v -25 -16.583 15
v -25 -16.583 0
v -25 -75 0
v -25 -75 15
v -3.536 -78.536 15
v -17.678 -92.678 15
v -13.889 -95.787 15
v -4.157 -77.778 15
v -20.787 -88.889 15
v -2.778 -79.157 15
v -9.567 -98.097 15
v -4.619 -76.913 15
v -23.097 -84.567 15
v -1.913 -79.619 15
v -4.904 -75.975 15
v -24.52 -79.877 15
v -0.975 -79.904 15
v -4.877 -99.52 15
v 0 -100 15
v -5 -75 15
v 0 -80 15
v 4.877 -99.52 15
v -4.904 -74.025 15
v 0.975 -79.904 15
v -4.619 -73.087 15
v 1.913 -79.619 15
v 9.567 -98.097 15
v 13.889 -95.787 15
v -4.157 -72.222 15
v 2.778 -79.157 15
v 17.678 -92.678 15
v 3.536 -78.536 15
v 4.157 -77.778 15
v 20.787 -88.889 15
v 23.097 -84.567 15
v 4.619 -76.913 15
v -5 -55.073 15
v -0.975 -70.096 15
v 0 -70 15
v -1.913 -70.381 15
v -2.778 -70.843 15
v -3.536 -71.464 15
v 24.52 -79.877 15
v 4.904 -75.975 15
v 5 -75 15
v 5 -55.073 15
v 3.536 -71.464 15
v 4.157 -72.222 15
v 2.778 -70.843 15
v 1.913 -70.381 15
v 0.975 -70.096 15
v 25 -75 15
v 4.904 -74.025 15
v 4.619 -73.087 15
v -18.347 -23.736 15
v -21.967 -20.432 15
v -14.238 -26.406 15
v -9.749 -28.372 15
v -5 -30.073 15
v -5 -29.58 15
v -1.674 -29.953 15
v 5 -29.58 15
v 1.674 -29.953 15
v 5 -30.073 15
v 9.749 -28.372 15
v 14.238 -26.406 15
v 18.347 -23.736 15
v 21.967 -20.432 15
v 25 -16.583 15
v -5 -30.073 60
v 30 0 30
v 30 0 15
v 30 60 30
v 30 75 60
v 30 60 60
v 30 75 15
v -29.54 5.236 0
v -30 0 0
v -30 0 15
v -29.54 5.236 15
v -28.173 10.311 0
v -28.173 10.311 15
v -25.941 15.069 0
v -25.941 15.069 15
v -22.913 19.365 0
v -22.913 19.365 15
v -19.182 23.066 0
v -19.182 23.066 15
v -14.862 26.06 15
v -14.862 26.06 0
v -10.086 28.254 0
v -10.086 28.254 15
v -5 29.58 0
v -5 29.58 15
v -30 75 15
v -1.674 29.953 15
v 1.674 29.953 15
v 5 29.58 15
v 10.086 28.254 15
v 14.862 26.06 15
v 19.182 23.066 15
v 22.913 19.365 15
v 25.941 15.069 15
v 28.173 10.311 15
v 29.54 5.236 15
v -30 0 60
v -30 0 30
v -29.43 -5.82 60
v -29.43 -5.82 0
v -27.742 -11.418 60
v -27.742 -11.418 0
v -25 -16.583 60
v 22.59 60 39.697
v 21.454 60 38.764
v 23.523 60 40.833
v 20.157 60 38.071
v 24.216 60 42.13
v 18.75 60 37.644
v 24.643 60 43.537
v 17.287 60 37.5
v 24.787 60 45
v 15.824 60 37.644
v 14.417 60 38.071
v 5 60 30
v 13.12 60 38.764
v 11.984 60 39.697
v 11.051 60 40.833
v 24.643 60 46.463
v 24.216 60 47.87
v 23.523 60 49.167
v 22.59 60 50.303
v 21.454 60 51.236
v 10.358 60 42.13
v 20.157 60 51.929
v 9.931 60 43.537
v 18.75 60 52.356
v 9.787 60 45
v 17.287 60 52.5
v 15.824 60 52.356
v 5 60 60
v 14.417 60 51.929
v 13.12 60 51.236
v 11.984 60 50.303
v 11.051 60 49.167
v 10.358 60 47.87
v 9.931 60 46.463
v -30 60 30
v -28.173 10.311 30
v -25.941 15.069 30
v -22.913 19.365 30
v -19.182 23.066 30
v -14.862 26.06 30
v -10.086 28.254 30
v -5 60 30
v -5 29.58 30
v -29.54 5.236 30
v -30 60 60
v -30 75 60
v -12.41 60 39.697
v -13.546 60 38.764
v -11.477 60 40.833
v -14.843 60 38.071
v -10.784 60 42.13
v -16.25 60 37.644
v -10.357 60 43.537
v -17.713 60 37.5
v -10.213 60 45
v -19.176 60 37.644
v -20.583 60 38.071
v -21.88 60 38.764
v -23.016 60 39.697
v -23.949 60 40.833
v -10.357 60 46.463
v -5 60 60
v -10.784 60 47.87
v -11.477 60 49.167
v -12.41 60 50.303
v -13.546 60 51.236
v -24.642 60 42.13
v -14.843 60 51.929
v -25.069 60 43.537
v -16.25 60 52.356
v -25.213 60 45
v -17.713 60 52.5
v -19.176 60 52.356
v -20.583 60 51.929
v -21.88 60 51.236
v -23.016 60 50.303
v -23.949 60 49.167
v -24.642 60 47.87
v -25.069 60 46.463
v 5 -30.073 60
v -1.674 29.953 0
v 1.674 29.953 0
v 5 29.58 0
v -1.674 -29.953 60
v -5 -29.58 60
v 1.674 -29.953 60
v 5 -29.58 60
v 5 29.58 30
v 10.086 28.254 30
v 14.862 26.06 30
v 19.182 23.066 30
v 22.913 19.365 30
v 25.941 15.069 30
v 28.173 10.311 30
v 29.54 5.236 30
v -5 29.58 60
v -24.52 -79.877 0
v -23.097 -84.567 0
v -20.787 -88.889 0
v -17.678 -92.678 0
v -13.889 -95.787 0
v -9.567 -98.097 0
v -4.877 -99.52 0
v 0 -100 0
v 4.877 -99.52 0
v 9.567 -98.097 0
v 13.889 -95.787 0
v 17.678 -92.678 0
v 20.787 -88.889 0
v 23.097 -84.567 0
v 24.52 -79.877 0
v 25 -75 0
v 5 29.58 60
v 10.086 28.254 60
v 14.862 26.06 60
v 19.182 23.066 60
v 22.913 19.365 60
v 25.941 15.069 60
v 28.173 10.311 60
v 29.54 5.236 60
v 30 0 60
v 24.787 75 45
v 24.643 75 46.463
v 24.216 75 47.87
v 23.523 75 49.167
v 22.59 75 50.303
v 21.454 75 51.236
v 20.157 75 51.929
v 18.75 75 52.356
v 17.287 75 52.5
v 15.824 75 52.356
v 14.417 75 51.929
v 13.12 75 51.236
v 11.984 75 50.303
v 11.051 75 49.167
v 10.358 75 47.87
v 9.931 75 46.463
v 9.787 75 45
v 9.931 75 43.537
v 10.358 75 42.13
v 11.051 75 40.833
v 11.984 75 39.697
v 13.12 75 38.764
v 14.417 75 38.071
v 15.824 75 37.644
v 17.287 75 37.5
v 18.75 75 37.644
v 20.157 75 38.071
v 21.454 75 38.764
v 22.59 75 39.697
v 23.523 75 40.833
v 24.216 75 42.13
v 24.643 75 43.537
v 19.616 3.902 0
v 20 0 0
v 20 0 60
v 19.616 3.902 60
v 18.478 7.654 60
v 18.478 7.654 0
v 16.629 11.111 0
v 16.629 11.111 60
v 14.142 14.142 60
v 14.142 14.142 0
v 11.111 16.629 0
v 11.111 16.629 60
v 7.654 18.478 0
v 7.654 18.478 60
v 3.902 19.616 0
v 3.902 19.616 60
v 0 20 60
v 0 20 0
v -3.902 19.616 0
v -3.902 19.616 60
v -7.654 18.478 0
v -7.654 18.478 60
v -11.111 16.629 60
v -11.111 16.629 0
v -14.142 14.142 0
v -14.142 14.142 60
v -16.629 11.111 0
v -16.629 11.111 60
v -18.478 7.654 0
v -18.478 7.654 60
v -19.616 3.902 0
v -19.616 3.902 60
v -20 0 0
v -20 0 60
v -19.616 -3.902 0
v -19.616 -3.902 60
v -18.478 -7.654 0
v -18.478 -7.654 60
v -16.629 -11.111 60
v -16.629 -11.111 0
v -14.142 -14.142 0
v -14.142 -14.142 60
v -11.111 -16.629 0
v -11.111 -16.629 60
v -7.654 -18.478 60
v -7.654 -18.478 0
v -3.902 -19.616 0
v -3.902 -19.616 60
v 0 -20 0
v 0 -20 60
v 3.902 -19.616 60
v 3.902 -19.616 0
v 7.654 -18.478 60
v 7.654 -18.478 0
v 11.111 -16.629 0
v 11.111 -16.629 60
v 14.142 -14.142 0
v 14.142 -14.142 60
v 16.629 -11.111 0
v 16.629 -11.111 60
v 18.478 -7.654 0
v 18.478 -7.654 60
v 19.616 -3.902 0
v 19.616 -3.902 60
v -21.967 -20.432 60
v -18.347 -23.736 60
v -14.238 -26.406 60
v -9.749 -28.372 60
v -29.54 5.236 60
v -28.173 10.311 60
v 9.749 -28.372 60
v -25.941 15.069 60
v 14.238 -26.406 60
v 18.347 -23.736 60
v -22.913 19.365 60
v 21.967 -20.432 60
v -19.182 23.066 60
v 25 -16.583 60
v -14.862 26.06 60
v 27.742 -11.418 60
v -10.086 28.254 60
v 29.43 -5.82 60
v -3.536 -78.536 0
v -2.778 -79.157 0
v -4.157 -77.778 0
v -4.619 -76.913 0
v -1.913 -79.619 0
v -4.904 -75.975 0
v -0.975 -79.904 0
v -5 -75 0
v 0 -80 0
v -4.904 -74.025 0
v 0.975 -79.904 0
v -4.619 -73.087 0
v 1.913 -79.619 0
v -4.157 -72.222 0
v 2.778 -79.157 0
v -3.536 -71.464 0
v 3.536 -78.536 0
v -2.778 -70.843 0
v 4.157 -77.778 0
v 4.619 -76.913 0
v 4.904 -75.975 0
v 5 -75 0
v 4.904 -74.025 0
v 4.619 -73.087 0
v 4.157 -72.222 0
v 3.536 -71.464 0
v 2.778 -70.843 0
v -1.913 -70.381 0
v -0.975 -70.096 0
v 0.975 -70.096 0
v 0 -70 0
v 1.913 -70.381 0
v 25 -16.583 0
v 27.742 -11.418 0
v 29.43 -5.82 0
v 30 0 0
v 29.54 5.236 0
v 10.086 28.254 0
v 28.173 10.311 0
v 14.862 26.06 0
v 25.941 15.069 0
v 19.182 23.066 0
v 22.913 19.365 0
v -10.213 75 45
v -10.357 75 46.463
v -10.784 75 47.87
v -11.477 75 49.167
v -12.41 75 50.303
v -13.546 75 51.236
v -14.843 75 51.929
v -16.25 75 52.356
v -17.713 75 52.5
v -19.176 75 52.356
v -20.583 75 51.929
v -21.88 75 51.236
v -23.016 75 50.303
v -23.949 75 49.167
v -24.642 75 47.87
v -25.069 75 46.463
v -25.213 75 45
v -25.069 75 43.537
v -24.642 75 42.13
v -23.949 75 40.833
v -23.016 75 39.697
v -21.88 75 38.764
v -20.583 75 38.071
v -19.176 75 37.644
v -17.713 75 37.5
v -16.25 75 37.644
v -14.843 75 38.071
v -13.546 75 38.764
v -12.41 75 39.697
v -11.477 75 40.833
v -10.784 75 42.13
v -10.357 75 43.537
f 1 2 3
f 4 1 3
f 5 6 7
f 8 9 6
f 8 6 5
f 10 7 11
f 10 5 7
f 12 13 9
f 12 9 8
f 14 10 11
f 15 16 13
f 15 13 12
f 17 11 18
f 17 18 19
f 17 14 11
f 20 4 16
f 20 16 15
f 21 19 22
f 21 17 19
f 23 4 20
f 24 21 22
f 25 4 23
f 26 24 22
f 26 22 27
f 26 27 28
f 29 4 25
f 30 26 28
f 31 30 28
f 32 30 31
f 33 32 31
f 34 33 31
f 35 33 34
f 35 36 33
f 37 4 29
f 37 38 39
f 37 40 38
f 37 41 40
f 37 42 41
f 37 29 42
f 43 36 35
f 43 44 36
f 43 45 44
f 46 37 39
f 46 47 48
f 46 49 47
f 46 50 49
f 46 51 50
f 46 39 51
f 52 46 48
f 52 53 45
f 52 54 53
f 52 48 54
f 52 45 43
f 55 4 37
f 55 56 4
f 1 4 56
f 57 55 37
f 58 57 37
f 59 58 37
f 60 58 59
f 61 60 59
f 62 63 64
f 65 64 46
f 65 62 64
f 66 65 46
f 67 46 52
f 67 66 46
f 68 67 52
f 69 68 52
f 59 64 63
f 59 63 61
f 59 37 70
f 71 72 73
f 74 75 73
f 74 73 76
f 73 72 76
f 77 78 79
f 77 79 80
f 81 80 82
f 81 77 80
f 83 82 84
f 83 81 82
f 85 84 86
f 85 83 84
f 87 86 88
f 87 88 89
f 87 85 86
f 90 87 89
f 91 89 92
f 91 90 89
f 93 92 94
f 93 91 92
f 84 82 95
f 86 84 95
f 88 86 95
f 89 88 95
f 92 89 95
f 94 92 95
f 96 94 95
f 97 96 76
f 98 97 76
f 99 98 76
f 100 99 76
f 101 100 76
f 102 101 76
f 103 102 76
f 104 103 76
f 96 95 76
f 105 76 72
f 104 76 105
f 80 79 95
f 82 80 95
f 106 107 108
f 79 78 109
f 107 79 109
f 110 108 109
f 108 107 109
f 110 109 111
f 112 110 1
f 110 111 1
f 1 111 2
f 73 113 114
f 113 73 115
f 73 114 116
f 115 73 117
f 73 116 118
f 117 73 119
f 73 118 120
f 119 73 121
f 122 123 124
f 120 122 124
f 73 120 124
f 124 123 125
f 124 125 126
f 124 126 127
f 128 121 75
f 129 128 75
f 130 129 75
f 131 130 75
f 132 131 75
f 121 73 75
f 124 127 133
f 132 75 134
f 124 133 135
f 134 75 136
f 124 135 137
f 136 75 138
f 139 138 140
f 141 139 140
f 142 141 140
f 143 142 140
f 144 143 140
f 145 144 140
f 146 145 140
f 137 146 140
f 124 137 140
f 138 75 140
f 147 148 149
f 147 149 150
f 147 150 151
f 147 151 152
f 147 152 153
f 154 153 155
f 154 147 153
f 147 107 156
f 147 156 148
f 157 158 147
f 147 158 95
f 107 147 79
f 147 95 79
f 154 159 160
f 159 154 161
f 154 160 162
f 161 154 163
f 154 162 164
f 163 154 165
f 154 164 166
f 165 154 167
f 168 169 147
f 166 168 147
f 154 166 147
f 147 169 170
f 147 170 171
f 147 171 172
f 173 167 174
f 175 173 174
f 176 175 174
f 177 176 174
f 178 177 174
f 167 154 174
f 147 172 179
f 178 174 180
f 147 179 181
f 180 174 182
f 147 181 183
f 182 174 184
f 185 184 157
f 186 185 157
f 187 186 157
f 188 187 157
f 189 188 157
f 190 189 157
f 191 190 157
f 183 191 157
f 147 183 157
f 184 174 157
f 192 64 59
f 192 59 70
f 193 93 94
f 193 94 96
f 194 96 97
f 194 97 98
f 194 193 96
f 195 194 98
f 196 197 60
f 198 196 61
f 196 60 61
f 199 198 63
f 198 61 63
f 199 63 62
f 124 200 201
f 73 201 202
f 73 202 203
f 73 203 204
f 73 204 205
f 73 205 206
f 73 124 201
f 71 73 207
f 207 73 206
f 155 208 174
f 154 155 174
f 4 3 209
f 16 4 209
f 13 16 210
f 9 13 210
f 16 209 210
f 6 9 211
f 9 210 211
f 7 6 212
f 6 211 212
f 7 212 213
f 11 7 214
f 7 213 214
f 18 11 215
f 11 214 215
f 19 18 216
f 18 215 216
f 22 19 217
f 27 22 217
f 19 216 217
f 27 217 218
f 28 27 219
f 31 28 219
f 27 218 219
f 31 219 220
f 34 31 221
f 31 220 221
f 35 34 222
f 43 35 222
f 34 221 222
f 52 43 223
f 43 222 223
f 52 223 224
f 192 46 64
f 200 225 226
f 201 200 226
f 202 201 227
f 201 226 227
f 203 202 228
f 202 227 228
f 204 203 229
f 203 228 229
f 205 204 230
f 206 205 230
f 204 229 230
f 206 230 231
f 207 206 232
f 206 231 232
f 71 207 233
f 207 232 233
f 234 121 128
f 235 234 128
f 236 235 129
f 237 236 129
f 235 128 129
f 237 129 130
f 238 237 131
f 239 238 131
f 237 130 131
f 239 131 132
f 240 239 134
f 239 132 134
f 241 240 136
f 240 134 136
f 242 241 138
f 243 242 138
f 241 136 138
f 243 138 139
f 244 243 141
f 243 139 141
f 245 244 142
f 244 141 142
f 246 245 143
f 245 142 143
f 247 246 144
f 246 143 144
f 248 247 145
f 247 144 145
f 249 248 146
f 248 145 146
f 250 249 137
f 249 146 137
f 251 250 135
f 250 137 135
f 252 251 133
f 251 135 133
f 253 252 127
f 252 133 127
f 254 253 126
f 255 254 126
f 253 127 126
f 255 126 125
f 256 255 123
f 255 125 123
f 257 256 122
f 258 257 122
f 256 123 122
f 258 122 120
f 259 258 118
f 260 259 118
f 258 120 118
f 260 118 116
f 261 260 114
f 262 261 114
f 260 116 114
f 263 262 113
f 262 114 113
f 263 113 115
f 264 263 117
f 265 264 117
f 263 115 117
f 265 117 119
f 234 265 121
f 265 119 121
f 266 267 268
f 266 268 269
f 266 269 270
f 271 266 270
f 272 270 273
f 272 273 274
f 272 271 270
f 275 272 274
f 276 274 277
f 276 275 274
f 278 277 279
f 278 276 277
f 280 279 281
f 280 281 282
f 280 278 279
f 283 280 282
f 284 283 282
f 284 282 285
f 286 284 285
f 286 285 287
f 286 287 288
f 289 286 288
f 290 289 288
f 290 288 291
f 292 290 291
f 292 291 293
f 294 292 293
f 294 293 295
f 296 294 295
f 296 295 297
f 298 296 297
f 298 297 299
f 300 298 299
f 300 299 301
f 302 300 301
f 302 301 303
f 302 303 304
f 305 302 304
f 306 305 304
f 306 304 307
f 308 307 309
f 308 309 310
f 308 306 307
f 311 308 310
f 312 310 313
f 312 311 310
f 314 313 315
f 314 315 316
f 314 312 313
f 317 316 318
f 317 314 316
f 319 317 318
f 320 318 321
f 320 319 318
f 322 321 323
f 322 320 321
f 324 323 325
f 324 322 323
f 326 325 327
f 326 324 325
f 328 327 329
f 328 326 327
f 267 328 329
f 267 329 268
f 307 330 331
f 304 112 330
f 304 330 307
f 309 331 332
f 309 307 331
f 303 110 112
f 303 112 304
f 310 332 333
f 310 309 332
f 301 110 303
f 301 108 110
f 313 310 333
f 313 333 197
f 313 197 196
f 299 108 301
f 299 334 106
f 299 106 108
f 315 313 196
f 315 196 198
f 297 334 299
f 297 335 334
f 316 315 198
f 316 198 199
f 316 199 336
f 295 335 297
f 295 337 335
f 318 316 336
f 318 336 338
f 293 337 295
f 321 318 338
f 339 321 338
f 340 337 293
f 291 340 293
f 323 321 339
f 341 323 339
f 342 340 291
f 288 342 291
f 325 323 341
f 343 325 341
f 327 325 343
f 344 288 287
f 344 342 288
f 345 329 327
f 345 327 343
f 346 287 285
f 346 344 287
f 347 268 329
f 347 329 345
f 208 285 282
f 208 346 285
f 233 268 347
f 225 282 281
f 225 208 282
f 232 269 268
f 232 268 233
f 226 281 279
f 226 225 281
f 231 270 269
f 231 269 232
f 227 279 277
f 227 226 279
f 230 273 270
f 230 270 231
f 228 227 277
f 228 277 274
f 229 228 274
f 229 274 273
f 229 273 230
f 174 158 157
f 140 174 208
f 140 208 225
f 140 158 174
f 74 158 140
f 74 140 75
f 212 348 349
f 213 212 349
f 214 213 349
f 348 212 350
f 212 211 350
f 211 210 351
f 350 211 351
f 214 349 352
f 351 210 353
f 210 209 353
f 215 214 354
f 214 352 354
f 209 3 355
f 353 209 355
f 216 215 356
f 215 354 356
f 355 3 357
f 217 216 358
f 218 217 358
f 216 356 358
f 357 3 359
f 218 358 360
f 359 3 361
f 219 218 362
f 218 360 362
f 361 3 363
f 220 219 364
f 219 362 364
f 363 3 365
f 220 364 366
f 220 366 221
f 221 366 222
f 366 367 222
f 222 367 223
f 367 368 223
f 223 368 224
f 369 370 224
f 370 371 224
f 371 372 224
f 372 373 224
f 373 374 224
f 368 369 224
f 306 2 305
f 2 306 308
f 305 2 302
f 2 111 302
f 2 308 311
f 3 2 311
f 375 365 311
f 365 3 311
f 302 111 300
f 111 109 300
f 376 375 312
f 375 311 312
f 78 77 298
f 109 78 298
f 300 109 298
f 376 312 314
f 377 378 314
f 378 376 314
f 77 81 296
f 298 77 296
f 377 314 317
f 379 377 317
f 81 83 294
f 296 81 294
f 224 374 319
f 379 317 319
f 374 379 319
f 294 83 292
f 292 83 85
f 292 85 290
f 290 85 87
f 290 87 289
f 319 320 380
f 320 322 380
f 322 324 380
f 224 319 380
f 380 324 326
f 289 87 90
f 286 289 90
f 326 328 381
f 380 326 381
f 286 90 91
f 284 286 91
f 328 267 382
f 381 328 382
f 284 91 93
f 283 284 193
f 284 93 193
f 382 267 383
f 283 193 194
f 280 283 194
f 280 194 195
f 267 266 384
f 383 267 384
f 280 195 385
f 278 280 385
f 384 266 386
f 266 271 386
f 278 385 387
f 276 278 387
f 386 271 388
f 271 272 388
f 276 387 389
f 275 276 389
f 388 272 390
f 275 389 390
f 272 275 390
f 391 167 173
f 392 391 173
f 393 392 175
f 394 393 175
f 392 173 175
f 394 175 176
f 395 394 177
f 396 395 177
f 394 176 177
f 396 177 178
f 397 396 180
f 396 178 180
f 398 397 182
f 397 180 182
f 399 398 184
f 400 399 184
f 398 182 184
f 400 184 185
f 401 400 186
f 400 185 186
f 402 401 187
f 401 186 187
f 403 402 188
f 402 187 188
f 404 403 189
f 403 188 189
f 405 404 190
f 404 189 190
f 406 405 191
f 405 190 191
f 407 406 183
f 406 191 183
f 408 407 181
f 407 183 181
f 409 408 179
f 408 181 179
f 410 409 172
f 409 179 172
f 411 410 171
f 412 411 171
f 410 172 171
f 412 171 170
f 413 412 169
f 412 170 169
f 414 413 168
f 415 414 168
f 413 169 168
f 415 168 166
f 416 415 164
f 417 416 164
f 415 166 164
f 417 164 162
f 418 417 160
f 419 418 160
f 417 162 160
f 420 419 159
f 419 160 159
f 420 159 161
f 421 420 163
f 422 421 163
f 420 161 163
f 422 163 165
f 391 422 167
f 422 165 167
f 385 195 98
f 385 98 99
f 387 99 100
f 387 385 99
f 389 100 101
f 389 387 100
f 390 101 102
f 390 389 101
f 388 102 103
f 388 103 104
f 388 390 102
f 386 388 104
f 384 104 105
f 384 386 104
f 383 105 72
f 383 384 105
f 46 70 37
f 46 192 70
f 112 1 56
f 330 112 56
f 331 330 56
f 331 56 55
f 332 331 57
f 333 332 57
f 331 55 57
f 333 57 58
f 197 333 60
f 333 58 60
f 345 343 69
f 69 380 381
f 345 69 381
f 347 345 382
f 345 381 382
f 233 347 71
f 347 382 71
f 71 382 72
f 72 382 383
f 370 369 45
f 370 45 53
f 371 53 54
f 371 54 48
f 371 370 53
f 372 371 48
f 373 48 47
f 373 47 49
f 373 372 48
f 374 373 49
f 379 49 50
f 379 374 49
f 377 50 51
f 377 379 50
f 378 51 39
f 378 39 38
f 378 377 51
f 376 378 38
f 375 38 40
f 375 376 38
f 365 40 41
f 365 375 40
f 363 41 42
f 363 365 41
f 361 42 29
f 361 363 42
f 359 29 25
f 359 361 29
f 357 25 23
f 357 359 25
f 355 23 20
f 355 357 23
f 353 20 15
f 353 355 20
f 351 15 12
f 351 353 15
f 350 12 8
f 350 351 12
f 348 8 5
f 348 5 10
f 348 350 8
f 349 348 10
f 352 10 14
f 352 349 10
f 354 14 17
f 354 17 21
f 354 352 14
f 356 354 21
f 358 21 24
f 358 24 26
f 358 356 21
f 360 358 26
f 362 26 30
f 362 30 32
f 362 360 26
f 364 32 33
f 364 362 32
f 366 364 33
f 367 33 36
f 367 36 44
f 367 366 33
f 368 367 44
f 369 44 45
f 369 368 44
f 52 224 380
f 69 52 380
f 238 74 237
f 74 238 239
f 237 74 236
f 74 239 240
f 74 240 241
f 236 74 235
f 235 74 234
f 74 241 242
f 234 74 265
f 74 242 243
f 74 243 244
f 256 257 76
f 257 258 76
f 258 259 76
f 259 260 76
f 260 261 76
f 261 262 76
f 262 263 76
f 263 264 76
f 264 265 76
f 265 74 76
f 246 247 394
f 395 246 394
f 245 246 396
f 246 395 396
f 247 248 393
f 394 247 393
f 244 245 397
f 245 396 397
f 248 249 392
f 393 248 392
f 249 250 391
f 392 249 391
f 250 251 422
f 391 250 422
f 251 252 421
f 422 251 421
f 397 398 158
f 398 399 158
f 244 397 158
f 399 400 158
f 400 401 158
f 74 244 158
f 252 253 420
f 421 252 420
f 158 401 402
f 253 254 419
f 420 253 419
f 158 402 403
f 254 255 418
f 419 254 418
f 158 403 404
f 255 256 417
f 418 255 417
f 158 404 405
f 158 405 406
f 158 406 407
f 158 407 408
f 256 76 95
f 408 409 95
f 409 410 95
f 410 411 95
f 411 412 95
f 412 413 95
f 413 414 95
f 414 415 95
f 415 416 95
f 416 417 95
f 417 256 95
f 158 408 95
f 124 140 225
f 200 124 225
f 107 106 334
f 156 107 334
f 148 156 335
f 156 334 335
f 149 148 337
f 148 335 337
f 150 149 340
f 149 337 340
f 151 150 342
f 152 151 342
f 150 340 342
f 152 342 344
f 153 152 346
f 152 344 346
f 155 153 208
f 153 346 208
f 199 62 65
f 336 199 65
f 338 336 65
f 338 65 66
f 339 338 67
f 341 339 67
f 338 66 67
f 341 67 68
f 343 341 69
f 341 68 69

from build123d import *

# Parameters (mm, degrees)
F0_R      = 20
F1_DEPTH  = 60
F0_R_2    = 5
F2_DEPTH  = 15
F3_DEPTH  = 60
F4_DEPTH  = 45
F5_DEPTH  = 15
F7_DEPTH  = 30
F9_DEPTH  = 5
F10_R     = 7.5
F11_DEPTH = 15


with BuildPart() as f1:
    # F0 (on Top) → F1 (new body)
    with BuildSketch(Plane.XY):
        with BuildLine():
            ThreePointArc((25, -16.5831239518), (28.7228132327, -8.6602540378), (30, 0))
            ThreePointArc((30, 0), (22.9128784748, 19.364916731), (5, 29.5803989155))
            ThreePointArc((5, 29.5803989155), (0, 30), (-5, 29.5803989155))
            ThreePointArc((-5, 29.5803989155), (-22.9128784748, 19.364916731), (-30, 0))
            ThreePointArc((-30, 0), (-28.7228132327, -8.6602540378), (-25, -16.5831239518))
            ThreePointArc((-25, -16.5831239518), (-16.3472410247, -25.1548744954), (-5, -29.5803989155))
            ThreePointArc((-5, -29.5803989155), (0, -30), (5, -29.5803989155))
            ThreePointArc((5, -29.5803989155), (16.3472410247, -25.1548744954), (25, -16.5831239518))
        make_face()
        Circle(F0_R, mode=Mode.SUBTRACT)
    extrude(amount=F1_DEPTH)

    # F0 (on Top) → F2 (join)
    with BuildSketch(Plane.XY):
        with BuildLine():
            Line((25, -75), (25, -16.5831239518))
            ThreePointArc((25, -16.5831239518), (16.3472410247, -25.1548744954), (5, -29.5803989155))
            Line((5, -29.5803989155), (5, -54.5803989155))
            Line((5, -54.5803989155), (0, -54.5803989155))
            Line((0, -54.5803989155), (-5, -54.5803989155))
            Line((-5, -54.5803989155), (-5, -29.5803989155))
            ThreePointArc((-5, -29.5803989155), (-16.3472410247, -25.1548744954), (-25, -16.5831239518))
            Line((-25, -16.5831239518), (-25, -75))
            ThreePointArc((-25, -75), (0, -100), (25, -75))
        make_face()
        with Locations((0, -75)):
            Circle(F0_R_2, mode=Mode.SUBTRACT)
        with BuildLine():
            Line((5, -54.5803989155), (5, -29.5803989155))
            ThreePointArc((5, -29.5803989155), (0, -30), (-5, -29.5803989155))
            Line((-5, -29.5803989155), (-5, -54.5803989155))
            Line((-5, -54.5803989155), (0, -54.5803989155))
            Line((0, -54.5803989155), (5, -54.5803989155))
        make_face()
    extrude(amount=F2_DEPTH)

    # F0 (on Top) → F3 (join)
    with BuildSketch(Plane.XY):
        with BuildLine():
            ThreePointArc((-30, 0), (-22.9128784748, 19.364916731), (-5, 29.5803989155))
            Line((-5, 29.5803989155), (-5, 60))
            Line((-5, 60), (-30, 60))
            Line((-30, 60), (-30, 0))
        make_face()
        with BuildLine():
            ThreePointArc((-5, 29.5803989155), (0, 30), (5, 29.5803989155))
            Line((5, 29.5803989155), (5, 60))
            Line((5, 60), (30, 60))
            Line((30, 60), (30, 75))
            Line((30, 75), (-30, 75))
            Line((-30, 75), (-30, 60))
            Line((-30, 60), (-5, 60))
            Line((-5, 60), (-5, 29.5803989155))
        make_face()
        with BuildLine():
            ThreePointArc((5, 29.5803989155), (22.9128784748, 19.364916731), (30, 0))
            Line((30, 0), (30, 60))
            Line((30, 60), (5, 60))
            Line((5, 60), (5, 29.5803989155))
        make_face()
    extrude(amount=F3_DEPTH)

    # F0 (on Top) → F4 (join)
    with BuildSketch(Plane.XY):
        with BuildLine():
            ThreePointArc((25, -16.5831239518), (28.7228132327, -8.6602540378), (30, 0))
            ThreePointArc((30, 0), (22.9128784748, 19.364916731), (5, 29.5803989155))
            ThreePointArc((5, 29.5803989155), (0, 30), (-5, 29.5803989155))
            ThreePointArc((-5, 29.5803989155), (-22.9128784748, 19.364916731), (-30, 0))
            ThreePointArc((-30, 0), (-28.7228132327, -8.6602540378), (-25, -16.5831239518))
            ThreePointArc((-25, -16.5831239518), (-16.3472410247, -25.1548744954), (-5, -29.5803989155))
            ThreePointArc((-5, -29.5803989155), (0, -30), (5, -29.5803989155))
            ThreePointArc((5, -29.5803989155), (16.3472410247, -25.1548744954), (25, -16.5831239518))
        make_face()
        Circle(F0_R, mode=Mode.SUBTRACT)
        with BuildLine():
            ThreePointArc((-5, 29.5803989155), (0, 30), (5, 29.5803989155))
            Line((5, 29.5803989155), (5, 60))
            Line((5, 60), (30, 60))
            Line((30, 60), (30, 75))
            Line((30, 75), (-30, 75))
            Line((-30, 75), (-30, 60))
            Line((-30, 60), (-5, 60))
            Line((-5, 60), (-5, 29.5803989155))
        make_face()
    extrude(amount=F4_DEPTH)

    # F0 (on Top) → F5 (cut)
    with BuildSketch(Plane.XY):
        with BuildLine():
            ThreePointArc((-30, 0), (-22.9128784748, 19.364916731), (-5, 29.5803989155))
            Line((-5, 29.5803989155), (-5, 60))
            Line((-5, 60), (-30, 60))
            Line((-30, 60), (-30, 0))
        make_face()
        with BuildLine():
            ThreePointArc((-5, 29.5803989155), (0, 30), (5, 29.5803989155))
            Line((5, 29.5803989155), (5, 60))
            Line((5, 60), (30, 60))
            Line((30, 60), (30, 75))
            Line((30, 75), (-30, 75))
            Line((-30, 75), (-30, 60))
            Line((-30, 60), (-5, 60))
            Line((-5, 60), (-5, 29.5803989155))
        make_face()
        with BuildLine():
            ThreePointArc((5, 29.5803989155), (22.9128784748, 19.364916731), (30, 0))
            Line((30, 0), (30, 60))
            Line((30, 60), (5, 60))
            Line((5, 60), (5, 29.5803989155))
        make_face()
    extrude(amount=F5_DEPTH, mode=Mode.SUBTRACT)

    # F6 (on face) → F7 (cut)
    with BuildSketch(Plane.XY.offset(60)):
        with BuildLine():
            Line((-5, 29.5803989155), (-5, 60))
            Line((-5, 60), (-30, 60))
            Line((-30, 60), (-30, 0))
            ThreePointArc((-30, 0), (-22.9128784748, 19.364916731), (-5, 29.5803989155))
        make_face()
        with BuildLine():
            Line((5, 60), (5, 29.5803989155))
            ThreePointArc((5, 29.5803989155), (22.9128784748, 19.364916731), (30, 0))
            Line((30, 0), (30, 60))
            Line((30, 60), (5, 60))
        make_face()
    extrude(amount=-F7_DEPTH, mode=Mode.SUBTRACT)

    # F8 (on Right) → F9 (join, symmetric)
    with BuildSketch(Plane.YZ):
        Polygon((-55.0730913877, 15), (-30.0730913877, 15), (-30.0730913877, 60), align=None)
    extrude(amount=F9_DEPTH, both=True)

    # F10 (on face) → F11 (cut)
    with BuildSketch(Plane.XZ.offset(-60)):
        with Locations((-17.7129209042, 45)):
            Circle(F10_R)
        with Locations((17.2870790958, 45)):
            Circle(F10_R)
    extrude(amount=-F11_DEPTH, mode=Mode.SUBTRACT)


solid = f1.part
